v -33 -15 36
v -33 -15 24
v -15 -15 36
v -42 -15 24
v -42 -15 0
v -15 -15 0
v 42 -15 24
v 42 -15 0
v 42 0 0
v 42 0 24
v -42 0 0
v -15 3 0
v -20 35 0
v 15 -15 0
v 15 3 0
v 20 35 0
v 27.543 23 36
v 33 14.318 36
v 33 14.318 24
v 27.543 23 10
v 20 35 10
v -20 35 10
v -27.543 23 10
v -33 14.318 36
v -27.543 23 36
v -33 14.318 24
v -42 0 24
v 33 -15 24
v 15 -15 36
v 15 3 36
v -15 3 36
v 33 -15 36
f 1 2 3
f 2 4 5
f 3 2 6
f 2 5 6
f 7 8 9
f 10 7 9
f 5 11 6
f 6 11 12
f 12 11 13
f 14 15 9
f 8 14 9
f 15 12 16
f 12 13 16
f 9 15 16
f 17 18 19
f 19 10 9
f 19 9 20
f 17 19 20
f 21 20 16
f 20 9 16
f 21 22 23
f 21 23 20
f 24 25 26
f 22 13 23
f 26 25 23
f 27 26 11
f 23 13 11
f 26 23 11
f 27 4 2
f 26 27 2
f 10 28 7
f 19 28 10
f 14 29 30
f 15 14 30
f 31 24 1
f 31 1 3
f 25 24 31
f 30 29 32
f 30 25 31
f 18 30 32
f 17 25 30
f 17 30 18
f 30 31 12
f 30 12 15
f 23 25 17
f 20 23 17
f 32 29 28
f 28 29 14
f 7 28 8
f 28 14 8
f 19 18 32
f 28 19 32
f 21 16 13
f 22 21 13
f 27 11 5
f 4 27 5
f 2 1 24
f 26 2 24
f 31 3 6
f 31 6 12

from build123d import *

# Parameters (mm, degrees)
SALIENTE_EXTRUIR1_DEPTH = 36
CORTAR_EXTRUIR1_DEPTH   = 26
CORTAR_EXTRUIR2_DEPTH   = 12
CROQUIS4_W              = 30
CROQUIS4_H              = 18
CORTAR_EXTRUIR3_DEPTH   = 66.459911396


with BuildPart() as part:
    # Croquis1 → Saliente-Extruir1 (new body)
    with BuildSketch(Plane.XY):
        Polygon((-42, -15), (42, -15), (42, 0), (20, 35), (-20, 35), (-42, 0), align=None)
    extrude(amount=SALIENTE_EXTRUIR1_DEPTH)

    # Croquis2 → Cortar-Extruir1 (cut)
    with BuildSketch(Plane.XY.offset(36)):
        Polygon((-20, 35), (-27.542857143, 23), (27.542857143, 23), (20, 35), align=None)
    extrude(amount=-CORTAR_EXTRUIR1_DEPTH, mode=Mode.SUBTRACT)

    # Croquis3 → Cortar-Extruir2 (cut)
    with BuildSketch(Plane.XY.offset(36)):
        Polygon((33, 14.318181818), (33, -15), (42, -15), (42, 0), align=None)
        Polygon((-33, -15), (-33, 14.318181818), (-42, 0), (-42, -15), align=None)
    extrude(amount=-CORTAR_EXTRUIR2_DEPTH, mode=Mode.SUBTRACT)

    # Croquis4 → Cortar-Extruir3 (cut, through all)
    with BuildSketch(Plane.XY.offset(36)):
        with Locations((0, -6)):
            Rectangle(CROQUIS4_W, CROQUIS4_H)
    extrude(amount=-CORTAR_EXTRUIR3_DEPTH, mode=Mode.SUBTRACT)


solid = part.part
